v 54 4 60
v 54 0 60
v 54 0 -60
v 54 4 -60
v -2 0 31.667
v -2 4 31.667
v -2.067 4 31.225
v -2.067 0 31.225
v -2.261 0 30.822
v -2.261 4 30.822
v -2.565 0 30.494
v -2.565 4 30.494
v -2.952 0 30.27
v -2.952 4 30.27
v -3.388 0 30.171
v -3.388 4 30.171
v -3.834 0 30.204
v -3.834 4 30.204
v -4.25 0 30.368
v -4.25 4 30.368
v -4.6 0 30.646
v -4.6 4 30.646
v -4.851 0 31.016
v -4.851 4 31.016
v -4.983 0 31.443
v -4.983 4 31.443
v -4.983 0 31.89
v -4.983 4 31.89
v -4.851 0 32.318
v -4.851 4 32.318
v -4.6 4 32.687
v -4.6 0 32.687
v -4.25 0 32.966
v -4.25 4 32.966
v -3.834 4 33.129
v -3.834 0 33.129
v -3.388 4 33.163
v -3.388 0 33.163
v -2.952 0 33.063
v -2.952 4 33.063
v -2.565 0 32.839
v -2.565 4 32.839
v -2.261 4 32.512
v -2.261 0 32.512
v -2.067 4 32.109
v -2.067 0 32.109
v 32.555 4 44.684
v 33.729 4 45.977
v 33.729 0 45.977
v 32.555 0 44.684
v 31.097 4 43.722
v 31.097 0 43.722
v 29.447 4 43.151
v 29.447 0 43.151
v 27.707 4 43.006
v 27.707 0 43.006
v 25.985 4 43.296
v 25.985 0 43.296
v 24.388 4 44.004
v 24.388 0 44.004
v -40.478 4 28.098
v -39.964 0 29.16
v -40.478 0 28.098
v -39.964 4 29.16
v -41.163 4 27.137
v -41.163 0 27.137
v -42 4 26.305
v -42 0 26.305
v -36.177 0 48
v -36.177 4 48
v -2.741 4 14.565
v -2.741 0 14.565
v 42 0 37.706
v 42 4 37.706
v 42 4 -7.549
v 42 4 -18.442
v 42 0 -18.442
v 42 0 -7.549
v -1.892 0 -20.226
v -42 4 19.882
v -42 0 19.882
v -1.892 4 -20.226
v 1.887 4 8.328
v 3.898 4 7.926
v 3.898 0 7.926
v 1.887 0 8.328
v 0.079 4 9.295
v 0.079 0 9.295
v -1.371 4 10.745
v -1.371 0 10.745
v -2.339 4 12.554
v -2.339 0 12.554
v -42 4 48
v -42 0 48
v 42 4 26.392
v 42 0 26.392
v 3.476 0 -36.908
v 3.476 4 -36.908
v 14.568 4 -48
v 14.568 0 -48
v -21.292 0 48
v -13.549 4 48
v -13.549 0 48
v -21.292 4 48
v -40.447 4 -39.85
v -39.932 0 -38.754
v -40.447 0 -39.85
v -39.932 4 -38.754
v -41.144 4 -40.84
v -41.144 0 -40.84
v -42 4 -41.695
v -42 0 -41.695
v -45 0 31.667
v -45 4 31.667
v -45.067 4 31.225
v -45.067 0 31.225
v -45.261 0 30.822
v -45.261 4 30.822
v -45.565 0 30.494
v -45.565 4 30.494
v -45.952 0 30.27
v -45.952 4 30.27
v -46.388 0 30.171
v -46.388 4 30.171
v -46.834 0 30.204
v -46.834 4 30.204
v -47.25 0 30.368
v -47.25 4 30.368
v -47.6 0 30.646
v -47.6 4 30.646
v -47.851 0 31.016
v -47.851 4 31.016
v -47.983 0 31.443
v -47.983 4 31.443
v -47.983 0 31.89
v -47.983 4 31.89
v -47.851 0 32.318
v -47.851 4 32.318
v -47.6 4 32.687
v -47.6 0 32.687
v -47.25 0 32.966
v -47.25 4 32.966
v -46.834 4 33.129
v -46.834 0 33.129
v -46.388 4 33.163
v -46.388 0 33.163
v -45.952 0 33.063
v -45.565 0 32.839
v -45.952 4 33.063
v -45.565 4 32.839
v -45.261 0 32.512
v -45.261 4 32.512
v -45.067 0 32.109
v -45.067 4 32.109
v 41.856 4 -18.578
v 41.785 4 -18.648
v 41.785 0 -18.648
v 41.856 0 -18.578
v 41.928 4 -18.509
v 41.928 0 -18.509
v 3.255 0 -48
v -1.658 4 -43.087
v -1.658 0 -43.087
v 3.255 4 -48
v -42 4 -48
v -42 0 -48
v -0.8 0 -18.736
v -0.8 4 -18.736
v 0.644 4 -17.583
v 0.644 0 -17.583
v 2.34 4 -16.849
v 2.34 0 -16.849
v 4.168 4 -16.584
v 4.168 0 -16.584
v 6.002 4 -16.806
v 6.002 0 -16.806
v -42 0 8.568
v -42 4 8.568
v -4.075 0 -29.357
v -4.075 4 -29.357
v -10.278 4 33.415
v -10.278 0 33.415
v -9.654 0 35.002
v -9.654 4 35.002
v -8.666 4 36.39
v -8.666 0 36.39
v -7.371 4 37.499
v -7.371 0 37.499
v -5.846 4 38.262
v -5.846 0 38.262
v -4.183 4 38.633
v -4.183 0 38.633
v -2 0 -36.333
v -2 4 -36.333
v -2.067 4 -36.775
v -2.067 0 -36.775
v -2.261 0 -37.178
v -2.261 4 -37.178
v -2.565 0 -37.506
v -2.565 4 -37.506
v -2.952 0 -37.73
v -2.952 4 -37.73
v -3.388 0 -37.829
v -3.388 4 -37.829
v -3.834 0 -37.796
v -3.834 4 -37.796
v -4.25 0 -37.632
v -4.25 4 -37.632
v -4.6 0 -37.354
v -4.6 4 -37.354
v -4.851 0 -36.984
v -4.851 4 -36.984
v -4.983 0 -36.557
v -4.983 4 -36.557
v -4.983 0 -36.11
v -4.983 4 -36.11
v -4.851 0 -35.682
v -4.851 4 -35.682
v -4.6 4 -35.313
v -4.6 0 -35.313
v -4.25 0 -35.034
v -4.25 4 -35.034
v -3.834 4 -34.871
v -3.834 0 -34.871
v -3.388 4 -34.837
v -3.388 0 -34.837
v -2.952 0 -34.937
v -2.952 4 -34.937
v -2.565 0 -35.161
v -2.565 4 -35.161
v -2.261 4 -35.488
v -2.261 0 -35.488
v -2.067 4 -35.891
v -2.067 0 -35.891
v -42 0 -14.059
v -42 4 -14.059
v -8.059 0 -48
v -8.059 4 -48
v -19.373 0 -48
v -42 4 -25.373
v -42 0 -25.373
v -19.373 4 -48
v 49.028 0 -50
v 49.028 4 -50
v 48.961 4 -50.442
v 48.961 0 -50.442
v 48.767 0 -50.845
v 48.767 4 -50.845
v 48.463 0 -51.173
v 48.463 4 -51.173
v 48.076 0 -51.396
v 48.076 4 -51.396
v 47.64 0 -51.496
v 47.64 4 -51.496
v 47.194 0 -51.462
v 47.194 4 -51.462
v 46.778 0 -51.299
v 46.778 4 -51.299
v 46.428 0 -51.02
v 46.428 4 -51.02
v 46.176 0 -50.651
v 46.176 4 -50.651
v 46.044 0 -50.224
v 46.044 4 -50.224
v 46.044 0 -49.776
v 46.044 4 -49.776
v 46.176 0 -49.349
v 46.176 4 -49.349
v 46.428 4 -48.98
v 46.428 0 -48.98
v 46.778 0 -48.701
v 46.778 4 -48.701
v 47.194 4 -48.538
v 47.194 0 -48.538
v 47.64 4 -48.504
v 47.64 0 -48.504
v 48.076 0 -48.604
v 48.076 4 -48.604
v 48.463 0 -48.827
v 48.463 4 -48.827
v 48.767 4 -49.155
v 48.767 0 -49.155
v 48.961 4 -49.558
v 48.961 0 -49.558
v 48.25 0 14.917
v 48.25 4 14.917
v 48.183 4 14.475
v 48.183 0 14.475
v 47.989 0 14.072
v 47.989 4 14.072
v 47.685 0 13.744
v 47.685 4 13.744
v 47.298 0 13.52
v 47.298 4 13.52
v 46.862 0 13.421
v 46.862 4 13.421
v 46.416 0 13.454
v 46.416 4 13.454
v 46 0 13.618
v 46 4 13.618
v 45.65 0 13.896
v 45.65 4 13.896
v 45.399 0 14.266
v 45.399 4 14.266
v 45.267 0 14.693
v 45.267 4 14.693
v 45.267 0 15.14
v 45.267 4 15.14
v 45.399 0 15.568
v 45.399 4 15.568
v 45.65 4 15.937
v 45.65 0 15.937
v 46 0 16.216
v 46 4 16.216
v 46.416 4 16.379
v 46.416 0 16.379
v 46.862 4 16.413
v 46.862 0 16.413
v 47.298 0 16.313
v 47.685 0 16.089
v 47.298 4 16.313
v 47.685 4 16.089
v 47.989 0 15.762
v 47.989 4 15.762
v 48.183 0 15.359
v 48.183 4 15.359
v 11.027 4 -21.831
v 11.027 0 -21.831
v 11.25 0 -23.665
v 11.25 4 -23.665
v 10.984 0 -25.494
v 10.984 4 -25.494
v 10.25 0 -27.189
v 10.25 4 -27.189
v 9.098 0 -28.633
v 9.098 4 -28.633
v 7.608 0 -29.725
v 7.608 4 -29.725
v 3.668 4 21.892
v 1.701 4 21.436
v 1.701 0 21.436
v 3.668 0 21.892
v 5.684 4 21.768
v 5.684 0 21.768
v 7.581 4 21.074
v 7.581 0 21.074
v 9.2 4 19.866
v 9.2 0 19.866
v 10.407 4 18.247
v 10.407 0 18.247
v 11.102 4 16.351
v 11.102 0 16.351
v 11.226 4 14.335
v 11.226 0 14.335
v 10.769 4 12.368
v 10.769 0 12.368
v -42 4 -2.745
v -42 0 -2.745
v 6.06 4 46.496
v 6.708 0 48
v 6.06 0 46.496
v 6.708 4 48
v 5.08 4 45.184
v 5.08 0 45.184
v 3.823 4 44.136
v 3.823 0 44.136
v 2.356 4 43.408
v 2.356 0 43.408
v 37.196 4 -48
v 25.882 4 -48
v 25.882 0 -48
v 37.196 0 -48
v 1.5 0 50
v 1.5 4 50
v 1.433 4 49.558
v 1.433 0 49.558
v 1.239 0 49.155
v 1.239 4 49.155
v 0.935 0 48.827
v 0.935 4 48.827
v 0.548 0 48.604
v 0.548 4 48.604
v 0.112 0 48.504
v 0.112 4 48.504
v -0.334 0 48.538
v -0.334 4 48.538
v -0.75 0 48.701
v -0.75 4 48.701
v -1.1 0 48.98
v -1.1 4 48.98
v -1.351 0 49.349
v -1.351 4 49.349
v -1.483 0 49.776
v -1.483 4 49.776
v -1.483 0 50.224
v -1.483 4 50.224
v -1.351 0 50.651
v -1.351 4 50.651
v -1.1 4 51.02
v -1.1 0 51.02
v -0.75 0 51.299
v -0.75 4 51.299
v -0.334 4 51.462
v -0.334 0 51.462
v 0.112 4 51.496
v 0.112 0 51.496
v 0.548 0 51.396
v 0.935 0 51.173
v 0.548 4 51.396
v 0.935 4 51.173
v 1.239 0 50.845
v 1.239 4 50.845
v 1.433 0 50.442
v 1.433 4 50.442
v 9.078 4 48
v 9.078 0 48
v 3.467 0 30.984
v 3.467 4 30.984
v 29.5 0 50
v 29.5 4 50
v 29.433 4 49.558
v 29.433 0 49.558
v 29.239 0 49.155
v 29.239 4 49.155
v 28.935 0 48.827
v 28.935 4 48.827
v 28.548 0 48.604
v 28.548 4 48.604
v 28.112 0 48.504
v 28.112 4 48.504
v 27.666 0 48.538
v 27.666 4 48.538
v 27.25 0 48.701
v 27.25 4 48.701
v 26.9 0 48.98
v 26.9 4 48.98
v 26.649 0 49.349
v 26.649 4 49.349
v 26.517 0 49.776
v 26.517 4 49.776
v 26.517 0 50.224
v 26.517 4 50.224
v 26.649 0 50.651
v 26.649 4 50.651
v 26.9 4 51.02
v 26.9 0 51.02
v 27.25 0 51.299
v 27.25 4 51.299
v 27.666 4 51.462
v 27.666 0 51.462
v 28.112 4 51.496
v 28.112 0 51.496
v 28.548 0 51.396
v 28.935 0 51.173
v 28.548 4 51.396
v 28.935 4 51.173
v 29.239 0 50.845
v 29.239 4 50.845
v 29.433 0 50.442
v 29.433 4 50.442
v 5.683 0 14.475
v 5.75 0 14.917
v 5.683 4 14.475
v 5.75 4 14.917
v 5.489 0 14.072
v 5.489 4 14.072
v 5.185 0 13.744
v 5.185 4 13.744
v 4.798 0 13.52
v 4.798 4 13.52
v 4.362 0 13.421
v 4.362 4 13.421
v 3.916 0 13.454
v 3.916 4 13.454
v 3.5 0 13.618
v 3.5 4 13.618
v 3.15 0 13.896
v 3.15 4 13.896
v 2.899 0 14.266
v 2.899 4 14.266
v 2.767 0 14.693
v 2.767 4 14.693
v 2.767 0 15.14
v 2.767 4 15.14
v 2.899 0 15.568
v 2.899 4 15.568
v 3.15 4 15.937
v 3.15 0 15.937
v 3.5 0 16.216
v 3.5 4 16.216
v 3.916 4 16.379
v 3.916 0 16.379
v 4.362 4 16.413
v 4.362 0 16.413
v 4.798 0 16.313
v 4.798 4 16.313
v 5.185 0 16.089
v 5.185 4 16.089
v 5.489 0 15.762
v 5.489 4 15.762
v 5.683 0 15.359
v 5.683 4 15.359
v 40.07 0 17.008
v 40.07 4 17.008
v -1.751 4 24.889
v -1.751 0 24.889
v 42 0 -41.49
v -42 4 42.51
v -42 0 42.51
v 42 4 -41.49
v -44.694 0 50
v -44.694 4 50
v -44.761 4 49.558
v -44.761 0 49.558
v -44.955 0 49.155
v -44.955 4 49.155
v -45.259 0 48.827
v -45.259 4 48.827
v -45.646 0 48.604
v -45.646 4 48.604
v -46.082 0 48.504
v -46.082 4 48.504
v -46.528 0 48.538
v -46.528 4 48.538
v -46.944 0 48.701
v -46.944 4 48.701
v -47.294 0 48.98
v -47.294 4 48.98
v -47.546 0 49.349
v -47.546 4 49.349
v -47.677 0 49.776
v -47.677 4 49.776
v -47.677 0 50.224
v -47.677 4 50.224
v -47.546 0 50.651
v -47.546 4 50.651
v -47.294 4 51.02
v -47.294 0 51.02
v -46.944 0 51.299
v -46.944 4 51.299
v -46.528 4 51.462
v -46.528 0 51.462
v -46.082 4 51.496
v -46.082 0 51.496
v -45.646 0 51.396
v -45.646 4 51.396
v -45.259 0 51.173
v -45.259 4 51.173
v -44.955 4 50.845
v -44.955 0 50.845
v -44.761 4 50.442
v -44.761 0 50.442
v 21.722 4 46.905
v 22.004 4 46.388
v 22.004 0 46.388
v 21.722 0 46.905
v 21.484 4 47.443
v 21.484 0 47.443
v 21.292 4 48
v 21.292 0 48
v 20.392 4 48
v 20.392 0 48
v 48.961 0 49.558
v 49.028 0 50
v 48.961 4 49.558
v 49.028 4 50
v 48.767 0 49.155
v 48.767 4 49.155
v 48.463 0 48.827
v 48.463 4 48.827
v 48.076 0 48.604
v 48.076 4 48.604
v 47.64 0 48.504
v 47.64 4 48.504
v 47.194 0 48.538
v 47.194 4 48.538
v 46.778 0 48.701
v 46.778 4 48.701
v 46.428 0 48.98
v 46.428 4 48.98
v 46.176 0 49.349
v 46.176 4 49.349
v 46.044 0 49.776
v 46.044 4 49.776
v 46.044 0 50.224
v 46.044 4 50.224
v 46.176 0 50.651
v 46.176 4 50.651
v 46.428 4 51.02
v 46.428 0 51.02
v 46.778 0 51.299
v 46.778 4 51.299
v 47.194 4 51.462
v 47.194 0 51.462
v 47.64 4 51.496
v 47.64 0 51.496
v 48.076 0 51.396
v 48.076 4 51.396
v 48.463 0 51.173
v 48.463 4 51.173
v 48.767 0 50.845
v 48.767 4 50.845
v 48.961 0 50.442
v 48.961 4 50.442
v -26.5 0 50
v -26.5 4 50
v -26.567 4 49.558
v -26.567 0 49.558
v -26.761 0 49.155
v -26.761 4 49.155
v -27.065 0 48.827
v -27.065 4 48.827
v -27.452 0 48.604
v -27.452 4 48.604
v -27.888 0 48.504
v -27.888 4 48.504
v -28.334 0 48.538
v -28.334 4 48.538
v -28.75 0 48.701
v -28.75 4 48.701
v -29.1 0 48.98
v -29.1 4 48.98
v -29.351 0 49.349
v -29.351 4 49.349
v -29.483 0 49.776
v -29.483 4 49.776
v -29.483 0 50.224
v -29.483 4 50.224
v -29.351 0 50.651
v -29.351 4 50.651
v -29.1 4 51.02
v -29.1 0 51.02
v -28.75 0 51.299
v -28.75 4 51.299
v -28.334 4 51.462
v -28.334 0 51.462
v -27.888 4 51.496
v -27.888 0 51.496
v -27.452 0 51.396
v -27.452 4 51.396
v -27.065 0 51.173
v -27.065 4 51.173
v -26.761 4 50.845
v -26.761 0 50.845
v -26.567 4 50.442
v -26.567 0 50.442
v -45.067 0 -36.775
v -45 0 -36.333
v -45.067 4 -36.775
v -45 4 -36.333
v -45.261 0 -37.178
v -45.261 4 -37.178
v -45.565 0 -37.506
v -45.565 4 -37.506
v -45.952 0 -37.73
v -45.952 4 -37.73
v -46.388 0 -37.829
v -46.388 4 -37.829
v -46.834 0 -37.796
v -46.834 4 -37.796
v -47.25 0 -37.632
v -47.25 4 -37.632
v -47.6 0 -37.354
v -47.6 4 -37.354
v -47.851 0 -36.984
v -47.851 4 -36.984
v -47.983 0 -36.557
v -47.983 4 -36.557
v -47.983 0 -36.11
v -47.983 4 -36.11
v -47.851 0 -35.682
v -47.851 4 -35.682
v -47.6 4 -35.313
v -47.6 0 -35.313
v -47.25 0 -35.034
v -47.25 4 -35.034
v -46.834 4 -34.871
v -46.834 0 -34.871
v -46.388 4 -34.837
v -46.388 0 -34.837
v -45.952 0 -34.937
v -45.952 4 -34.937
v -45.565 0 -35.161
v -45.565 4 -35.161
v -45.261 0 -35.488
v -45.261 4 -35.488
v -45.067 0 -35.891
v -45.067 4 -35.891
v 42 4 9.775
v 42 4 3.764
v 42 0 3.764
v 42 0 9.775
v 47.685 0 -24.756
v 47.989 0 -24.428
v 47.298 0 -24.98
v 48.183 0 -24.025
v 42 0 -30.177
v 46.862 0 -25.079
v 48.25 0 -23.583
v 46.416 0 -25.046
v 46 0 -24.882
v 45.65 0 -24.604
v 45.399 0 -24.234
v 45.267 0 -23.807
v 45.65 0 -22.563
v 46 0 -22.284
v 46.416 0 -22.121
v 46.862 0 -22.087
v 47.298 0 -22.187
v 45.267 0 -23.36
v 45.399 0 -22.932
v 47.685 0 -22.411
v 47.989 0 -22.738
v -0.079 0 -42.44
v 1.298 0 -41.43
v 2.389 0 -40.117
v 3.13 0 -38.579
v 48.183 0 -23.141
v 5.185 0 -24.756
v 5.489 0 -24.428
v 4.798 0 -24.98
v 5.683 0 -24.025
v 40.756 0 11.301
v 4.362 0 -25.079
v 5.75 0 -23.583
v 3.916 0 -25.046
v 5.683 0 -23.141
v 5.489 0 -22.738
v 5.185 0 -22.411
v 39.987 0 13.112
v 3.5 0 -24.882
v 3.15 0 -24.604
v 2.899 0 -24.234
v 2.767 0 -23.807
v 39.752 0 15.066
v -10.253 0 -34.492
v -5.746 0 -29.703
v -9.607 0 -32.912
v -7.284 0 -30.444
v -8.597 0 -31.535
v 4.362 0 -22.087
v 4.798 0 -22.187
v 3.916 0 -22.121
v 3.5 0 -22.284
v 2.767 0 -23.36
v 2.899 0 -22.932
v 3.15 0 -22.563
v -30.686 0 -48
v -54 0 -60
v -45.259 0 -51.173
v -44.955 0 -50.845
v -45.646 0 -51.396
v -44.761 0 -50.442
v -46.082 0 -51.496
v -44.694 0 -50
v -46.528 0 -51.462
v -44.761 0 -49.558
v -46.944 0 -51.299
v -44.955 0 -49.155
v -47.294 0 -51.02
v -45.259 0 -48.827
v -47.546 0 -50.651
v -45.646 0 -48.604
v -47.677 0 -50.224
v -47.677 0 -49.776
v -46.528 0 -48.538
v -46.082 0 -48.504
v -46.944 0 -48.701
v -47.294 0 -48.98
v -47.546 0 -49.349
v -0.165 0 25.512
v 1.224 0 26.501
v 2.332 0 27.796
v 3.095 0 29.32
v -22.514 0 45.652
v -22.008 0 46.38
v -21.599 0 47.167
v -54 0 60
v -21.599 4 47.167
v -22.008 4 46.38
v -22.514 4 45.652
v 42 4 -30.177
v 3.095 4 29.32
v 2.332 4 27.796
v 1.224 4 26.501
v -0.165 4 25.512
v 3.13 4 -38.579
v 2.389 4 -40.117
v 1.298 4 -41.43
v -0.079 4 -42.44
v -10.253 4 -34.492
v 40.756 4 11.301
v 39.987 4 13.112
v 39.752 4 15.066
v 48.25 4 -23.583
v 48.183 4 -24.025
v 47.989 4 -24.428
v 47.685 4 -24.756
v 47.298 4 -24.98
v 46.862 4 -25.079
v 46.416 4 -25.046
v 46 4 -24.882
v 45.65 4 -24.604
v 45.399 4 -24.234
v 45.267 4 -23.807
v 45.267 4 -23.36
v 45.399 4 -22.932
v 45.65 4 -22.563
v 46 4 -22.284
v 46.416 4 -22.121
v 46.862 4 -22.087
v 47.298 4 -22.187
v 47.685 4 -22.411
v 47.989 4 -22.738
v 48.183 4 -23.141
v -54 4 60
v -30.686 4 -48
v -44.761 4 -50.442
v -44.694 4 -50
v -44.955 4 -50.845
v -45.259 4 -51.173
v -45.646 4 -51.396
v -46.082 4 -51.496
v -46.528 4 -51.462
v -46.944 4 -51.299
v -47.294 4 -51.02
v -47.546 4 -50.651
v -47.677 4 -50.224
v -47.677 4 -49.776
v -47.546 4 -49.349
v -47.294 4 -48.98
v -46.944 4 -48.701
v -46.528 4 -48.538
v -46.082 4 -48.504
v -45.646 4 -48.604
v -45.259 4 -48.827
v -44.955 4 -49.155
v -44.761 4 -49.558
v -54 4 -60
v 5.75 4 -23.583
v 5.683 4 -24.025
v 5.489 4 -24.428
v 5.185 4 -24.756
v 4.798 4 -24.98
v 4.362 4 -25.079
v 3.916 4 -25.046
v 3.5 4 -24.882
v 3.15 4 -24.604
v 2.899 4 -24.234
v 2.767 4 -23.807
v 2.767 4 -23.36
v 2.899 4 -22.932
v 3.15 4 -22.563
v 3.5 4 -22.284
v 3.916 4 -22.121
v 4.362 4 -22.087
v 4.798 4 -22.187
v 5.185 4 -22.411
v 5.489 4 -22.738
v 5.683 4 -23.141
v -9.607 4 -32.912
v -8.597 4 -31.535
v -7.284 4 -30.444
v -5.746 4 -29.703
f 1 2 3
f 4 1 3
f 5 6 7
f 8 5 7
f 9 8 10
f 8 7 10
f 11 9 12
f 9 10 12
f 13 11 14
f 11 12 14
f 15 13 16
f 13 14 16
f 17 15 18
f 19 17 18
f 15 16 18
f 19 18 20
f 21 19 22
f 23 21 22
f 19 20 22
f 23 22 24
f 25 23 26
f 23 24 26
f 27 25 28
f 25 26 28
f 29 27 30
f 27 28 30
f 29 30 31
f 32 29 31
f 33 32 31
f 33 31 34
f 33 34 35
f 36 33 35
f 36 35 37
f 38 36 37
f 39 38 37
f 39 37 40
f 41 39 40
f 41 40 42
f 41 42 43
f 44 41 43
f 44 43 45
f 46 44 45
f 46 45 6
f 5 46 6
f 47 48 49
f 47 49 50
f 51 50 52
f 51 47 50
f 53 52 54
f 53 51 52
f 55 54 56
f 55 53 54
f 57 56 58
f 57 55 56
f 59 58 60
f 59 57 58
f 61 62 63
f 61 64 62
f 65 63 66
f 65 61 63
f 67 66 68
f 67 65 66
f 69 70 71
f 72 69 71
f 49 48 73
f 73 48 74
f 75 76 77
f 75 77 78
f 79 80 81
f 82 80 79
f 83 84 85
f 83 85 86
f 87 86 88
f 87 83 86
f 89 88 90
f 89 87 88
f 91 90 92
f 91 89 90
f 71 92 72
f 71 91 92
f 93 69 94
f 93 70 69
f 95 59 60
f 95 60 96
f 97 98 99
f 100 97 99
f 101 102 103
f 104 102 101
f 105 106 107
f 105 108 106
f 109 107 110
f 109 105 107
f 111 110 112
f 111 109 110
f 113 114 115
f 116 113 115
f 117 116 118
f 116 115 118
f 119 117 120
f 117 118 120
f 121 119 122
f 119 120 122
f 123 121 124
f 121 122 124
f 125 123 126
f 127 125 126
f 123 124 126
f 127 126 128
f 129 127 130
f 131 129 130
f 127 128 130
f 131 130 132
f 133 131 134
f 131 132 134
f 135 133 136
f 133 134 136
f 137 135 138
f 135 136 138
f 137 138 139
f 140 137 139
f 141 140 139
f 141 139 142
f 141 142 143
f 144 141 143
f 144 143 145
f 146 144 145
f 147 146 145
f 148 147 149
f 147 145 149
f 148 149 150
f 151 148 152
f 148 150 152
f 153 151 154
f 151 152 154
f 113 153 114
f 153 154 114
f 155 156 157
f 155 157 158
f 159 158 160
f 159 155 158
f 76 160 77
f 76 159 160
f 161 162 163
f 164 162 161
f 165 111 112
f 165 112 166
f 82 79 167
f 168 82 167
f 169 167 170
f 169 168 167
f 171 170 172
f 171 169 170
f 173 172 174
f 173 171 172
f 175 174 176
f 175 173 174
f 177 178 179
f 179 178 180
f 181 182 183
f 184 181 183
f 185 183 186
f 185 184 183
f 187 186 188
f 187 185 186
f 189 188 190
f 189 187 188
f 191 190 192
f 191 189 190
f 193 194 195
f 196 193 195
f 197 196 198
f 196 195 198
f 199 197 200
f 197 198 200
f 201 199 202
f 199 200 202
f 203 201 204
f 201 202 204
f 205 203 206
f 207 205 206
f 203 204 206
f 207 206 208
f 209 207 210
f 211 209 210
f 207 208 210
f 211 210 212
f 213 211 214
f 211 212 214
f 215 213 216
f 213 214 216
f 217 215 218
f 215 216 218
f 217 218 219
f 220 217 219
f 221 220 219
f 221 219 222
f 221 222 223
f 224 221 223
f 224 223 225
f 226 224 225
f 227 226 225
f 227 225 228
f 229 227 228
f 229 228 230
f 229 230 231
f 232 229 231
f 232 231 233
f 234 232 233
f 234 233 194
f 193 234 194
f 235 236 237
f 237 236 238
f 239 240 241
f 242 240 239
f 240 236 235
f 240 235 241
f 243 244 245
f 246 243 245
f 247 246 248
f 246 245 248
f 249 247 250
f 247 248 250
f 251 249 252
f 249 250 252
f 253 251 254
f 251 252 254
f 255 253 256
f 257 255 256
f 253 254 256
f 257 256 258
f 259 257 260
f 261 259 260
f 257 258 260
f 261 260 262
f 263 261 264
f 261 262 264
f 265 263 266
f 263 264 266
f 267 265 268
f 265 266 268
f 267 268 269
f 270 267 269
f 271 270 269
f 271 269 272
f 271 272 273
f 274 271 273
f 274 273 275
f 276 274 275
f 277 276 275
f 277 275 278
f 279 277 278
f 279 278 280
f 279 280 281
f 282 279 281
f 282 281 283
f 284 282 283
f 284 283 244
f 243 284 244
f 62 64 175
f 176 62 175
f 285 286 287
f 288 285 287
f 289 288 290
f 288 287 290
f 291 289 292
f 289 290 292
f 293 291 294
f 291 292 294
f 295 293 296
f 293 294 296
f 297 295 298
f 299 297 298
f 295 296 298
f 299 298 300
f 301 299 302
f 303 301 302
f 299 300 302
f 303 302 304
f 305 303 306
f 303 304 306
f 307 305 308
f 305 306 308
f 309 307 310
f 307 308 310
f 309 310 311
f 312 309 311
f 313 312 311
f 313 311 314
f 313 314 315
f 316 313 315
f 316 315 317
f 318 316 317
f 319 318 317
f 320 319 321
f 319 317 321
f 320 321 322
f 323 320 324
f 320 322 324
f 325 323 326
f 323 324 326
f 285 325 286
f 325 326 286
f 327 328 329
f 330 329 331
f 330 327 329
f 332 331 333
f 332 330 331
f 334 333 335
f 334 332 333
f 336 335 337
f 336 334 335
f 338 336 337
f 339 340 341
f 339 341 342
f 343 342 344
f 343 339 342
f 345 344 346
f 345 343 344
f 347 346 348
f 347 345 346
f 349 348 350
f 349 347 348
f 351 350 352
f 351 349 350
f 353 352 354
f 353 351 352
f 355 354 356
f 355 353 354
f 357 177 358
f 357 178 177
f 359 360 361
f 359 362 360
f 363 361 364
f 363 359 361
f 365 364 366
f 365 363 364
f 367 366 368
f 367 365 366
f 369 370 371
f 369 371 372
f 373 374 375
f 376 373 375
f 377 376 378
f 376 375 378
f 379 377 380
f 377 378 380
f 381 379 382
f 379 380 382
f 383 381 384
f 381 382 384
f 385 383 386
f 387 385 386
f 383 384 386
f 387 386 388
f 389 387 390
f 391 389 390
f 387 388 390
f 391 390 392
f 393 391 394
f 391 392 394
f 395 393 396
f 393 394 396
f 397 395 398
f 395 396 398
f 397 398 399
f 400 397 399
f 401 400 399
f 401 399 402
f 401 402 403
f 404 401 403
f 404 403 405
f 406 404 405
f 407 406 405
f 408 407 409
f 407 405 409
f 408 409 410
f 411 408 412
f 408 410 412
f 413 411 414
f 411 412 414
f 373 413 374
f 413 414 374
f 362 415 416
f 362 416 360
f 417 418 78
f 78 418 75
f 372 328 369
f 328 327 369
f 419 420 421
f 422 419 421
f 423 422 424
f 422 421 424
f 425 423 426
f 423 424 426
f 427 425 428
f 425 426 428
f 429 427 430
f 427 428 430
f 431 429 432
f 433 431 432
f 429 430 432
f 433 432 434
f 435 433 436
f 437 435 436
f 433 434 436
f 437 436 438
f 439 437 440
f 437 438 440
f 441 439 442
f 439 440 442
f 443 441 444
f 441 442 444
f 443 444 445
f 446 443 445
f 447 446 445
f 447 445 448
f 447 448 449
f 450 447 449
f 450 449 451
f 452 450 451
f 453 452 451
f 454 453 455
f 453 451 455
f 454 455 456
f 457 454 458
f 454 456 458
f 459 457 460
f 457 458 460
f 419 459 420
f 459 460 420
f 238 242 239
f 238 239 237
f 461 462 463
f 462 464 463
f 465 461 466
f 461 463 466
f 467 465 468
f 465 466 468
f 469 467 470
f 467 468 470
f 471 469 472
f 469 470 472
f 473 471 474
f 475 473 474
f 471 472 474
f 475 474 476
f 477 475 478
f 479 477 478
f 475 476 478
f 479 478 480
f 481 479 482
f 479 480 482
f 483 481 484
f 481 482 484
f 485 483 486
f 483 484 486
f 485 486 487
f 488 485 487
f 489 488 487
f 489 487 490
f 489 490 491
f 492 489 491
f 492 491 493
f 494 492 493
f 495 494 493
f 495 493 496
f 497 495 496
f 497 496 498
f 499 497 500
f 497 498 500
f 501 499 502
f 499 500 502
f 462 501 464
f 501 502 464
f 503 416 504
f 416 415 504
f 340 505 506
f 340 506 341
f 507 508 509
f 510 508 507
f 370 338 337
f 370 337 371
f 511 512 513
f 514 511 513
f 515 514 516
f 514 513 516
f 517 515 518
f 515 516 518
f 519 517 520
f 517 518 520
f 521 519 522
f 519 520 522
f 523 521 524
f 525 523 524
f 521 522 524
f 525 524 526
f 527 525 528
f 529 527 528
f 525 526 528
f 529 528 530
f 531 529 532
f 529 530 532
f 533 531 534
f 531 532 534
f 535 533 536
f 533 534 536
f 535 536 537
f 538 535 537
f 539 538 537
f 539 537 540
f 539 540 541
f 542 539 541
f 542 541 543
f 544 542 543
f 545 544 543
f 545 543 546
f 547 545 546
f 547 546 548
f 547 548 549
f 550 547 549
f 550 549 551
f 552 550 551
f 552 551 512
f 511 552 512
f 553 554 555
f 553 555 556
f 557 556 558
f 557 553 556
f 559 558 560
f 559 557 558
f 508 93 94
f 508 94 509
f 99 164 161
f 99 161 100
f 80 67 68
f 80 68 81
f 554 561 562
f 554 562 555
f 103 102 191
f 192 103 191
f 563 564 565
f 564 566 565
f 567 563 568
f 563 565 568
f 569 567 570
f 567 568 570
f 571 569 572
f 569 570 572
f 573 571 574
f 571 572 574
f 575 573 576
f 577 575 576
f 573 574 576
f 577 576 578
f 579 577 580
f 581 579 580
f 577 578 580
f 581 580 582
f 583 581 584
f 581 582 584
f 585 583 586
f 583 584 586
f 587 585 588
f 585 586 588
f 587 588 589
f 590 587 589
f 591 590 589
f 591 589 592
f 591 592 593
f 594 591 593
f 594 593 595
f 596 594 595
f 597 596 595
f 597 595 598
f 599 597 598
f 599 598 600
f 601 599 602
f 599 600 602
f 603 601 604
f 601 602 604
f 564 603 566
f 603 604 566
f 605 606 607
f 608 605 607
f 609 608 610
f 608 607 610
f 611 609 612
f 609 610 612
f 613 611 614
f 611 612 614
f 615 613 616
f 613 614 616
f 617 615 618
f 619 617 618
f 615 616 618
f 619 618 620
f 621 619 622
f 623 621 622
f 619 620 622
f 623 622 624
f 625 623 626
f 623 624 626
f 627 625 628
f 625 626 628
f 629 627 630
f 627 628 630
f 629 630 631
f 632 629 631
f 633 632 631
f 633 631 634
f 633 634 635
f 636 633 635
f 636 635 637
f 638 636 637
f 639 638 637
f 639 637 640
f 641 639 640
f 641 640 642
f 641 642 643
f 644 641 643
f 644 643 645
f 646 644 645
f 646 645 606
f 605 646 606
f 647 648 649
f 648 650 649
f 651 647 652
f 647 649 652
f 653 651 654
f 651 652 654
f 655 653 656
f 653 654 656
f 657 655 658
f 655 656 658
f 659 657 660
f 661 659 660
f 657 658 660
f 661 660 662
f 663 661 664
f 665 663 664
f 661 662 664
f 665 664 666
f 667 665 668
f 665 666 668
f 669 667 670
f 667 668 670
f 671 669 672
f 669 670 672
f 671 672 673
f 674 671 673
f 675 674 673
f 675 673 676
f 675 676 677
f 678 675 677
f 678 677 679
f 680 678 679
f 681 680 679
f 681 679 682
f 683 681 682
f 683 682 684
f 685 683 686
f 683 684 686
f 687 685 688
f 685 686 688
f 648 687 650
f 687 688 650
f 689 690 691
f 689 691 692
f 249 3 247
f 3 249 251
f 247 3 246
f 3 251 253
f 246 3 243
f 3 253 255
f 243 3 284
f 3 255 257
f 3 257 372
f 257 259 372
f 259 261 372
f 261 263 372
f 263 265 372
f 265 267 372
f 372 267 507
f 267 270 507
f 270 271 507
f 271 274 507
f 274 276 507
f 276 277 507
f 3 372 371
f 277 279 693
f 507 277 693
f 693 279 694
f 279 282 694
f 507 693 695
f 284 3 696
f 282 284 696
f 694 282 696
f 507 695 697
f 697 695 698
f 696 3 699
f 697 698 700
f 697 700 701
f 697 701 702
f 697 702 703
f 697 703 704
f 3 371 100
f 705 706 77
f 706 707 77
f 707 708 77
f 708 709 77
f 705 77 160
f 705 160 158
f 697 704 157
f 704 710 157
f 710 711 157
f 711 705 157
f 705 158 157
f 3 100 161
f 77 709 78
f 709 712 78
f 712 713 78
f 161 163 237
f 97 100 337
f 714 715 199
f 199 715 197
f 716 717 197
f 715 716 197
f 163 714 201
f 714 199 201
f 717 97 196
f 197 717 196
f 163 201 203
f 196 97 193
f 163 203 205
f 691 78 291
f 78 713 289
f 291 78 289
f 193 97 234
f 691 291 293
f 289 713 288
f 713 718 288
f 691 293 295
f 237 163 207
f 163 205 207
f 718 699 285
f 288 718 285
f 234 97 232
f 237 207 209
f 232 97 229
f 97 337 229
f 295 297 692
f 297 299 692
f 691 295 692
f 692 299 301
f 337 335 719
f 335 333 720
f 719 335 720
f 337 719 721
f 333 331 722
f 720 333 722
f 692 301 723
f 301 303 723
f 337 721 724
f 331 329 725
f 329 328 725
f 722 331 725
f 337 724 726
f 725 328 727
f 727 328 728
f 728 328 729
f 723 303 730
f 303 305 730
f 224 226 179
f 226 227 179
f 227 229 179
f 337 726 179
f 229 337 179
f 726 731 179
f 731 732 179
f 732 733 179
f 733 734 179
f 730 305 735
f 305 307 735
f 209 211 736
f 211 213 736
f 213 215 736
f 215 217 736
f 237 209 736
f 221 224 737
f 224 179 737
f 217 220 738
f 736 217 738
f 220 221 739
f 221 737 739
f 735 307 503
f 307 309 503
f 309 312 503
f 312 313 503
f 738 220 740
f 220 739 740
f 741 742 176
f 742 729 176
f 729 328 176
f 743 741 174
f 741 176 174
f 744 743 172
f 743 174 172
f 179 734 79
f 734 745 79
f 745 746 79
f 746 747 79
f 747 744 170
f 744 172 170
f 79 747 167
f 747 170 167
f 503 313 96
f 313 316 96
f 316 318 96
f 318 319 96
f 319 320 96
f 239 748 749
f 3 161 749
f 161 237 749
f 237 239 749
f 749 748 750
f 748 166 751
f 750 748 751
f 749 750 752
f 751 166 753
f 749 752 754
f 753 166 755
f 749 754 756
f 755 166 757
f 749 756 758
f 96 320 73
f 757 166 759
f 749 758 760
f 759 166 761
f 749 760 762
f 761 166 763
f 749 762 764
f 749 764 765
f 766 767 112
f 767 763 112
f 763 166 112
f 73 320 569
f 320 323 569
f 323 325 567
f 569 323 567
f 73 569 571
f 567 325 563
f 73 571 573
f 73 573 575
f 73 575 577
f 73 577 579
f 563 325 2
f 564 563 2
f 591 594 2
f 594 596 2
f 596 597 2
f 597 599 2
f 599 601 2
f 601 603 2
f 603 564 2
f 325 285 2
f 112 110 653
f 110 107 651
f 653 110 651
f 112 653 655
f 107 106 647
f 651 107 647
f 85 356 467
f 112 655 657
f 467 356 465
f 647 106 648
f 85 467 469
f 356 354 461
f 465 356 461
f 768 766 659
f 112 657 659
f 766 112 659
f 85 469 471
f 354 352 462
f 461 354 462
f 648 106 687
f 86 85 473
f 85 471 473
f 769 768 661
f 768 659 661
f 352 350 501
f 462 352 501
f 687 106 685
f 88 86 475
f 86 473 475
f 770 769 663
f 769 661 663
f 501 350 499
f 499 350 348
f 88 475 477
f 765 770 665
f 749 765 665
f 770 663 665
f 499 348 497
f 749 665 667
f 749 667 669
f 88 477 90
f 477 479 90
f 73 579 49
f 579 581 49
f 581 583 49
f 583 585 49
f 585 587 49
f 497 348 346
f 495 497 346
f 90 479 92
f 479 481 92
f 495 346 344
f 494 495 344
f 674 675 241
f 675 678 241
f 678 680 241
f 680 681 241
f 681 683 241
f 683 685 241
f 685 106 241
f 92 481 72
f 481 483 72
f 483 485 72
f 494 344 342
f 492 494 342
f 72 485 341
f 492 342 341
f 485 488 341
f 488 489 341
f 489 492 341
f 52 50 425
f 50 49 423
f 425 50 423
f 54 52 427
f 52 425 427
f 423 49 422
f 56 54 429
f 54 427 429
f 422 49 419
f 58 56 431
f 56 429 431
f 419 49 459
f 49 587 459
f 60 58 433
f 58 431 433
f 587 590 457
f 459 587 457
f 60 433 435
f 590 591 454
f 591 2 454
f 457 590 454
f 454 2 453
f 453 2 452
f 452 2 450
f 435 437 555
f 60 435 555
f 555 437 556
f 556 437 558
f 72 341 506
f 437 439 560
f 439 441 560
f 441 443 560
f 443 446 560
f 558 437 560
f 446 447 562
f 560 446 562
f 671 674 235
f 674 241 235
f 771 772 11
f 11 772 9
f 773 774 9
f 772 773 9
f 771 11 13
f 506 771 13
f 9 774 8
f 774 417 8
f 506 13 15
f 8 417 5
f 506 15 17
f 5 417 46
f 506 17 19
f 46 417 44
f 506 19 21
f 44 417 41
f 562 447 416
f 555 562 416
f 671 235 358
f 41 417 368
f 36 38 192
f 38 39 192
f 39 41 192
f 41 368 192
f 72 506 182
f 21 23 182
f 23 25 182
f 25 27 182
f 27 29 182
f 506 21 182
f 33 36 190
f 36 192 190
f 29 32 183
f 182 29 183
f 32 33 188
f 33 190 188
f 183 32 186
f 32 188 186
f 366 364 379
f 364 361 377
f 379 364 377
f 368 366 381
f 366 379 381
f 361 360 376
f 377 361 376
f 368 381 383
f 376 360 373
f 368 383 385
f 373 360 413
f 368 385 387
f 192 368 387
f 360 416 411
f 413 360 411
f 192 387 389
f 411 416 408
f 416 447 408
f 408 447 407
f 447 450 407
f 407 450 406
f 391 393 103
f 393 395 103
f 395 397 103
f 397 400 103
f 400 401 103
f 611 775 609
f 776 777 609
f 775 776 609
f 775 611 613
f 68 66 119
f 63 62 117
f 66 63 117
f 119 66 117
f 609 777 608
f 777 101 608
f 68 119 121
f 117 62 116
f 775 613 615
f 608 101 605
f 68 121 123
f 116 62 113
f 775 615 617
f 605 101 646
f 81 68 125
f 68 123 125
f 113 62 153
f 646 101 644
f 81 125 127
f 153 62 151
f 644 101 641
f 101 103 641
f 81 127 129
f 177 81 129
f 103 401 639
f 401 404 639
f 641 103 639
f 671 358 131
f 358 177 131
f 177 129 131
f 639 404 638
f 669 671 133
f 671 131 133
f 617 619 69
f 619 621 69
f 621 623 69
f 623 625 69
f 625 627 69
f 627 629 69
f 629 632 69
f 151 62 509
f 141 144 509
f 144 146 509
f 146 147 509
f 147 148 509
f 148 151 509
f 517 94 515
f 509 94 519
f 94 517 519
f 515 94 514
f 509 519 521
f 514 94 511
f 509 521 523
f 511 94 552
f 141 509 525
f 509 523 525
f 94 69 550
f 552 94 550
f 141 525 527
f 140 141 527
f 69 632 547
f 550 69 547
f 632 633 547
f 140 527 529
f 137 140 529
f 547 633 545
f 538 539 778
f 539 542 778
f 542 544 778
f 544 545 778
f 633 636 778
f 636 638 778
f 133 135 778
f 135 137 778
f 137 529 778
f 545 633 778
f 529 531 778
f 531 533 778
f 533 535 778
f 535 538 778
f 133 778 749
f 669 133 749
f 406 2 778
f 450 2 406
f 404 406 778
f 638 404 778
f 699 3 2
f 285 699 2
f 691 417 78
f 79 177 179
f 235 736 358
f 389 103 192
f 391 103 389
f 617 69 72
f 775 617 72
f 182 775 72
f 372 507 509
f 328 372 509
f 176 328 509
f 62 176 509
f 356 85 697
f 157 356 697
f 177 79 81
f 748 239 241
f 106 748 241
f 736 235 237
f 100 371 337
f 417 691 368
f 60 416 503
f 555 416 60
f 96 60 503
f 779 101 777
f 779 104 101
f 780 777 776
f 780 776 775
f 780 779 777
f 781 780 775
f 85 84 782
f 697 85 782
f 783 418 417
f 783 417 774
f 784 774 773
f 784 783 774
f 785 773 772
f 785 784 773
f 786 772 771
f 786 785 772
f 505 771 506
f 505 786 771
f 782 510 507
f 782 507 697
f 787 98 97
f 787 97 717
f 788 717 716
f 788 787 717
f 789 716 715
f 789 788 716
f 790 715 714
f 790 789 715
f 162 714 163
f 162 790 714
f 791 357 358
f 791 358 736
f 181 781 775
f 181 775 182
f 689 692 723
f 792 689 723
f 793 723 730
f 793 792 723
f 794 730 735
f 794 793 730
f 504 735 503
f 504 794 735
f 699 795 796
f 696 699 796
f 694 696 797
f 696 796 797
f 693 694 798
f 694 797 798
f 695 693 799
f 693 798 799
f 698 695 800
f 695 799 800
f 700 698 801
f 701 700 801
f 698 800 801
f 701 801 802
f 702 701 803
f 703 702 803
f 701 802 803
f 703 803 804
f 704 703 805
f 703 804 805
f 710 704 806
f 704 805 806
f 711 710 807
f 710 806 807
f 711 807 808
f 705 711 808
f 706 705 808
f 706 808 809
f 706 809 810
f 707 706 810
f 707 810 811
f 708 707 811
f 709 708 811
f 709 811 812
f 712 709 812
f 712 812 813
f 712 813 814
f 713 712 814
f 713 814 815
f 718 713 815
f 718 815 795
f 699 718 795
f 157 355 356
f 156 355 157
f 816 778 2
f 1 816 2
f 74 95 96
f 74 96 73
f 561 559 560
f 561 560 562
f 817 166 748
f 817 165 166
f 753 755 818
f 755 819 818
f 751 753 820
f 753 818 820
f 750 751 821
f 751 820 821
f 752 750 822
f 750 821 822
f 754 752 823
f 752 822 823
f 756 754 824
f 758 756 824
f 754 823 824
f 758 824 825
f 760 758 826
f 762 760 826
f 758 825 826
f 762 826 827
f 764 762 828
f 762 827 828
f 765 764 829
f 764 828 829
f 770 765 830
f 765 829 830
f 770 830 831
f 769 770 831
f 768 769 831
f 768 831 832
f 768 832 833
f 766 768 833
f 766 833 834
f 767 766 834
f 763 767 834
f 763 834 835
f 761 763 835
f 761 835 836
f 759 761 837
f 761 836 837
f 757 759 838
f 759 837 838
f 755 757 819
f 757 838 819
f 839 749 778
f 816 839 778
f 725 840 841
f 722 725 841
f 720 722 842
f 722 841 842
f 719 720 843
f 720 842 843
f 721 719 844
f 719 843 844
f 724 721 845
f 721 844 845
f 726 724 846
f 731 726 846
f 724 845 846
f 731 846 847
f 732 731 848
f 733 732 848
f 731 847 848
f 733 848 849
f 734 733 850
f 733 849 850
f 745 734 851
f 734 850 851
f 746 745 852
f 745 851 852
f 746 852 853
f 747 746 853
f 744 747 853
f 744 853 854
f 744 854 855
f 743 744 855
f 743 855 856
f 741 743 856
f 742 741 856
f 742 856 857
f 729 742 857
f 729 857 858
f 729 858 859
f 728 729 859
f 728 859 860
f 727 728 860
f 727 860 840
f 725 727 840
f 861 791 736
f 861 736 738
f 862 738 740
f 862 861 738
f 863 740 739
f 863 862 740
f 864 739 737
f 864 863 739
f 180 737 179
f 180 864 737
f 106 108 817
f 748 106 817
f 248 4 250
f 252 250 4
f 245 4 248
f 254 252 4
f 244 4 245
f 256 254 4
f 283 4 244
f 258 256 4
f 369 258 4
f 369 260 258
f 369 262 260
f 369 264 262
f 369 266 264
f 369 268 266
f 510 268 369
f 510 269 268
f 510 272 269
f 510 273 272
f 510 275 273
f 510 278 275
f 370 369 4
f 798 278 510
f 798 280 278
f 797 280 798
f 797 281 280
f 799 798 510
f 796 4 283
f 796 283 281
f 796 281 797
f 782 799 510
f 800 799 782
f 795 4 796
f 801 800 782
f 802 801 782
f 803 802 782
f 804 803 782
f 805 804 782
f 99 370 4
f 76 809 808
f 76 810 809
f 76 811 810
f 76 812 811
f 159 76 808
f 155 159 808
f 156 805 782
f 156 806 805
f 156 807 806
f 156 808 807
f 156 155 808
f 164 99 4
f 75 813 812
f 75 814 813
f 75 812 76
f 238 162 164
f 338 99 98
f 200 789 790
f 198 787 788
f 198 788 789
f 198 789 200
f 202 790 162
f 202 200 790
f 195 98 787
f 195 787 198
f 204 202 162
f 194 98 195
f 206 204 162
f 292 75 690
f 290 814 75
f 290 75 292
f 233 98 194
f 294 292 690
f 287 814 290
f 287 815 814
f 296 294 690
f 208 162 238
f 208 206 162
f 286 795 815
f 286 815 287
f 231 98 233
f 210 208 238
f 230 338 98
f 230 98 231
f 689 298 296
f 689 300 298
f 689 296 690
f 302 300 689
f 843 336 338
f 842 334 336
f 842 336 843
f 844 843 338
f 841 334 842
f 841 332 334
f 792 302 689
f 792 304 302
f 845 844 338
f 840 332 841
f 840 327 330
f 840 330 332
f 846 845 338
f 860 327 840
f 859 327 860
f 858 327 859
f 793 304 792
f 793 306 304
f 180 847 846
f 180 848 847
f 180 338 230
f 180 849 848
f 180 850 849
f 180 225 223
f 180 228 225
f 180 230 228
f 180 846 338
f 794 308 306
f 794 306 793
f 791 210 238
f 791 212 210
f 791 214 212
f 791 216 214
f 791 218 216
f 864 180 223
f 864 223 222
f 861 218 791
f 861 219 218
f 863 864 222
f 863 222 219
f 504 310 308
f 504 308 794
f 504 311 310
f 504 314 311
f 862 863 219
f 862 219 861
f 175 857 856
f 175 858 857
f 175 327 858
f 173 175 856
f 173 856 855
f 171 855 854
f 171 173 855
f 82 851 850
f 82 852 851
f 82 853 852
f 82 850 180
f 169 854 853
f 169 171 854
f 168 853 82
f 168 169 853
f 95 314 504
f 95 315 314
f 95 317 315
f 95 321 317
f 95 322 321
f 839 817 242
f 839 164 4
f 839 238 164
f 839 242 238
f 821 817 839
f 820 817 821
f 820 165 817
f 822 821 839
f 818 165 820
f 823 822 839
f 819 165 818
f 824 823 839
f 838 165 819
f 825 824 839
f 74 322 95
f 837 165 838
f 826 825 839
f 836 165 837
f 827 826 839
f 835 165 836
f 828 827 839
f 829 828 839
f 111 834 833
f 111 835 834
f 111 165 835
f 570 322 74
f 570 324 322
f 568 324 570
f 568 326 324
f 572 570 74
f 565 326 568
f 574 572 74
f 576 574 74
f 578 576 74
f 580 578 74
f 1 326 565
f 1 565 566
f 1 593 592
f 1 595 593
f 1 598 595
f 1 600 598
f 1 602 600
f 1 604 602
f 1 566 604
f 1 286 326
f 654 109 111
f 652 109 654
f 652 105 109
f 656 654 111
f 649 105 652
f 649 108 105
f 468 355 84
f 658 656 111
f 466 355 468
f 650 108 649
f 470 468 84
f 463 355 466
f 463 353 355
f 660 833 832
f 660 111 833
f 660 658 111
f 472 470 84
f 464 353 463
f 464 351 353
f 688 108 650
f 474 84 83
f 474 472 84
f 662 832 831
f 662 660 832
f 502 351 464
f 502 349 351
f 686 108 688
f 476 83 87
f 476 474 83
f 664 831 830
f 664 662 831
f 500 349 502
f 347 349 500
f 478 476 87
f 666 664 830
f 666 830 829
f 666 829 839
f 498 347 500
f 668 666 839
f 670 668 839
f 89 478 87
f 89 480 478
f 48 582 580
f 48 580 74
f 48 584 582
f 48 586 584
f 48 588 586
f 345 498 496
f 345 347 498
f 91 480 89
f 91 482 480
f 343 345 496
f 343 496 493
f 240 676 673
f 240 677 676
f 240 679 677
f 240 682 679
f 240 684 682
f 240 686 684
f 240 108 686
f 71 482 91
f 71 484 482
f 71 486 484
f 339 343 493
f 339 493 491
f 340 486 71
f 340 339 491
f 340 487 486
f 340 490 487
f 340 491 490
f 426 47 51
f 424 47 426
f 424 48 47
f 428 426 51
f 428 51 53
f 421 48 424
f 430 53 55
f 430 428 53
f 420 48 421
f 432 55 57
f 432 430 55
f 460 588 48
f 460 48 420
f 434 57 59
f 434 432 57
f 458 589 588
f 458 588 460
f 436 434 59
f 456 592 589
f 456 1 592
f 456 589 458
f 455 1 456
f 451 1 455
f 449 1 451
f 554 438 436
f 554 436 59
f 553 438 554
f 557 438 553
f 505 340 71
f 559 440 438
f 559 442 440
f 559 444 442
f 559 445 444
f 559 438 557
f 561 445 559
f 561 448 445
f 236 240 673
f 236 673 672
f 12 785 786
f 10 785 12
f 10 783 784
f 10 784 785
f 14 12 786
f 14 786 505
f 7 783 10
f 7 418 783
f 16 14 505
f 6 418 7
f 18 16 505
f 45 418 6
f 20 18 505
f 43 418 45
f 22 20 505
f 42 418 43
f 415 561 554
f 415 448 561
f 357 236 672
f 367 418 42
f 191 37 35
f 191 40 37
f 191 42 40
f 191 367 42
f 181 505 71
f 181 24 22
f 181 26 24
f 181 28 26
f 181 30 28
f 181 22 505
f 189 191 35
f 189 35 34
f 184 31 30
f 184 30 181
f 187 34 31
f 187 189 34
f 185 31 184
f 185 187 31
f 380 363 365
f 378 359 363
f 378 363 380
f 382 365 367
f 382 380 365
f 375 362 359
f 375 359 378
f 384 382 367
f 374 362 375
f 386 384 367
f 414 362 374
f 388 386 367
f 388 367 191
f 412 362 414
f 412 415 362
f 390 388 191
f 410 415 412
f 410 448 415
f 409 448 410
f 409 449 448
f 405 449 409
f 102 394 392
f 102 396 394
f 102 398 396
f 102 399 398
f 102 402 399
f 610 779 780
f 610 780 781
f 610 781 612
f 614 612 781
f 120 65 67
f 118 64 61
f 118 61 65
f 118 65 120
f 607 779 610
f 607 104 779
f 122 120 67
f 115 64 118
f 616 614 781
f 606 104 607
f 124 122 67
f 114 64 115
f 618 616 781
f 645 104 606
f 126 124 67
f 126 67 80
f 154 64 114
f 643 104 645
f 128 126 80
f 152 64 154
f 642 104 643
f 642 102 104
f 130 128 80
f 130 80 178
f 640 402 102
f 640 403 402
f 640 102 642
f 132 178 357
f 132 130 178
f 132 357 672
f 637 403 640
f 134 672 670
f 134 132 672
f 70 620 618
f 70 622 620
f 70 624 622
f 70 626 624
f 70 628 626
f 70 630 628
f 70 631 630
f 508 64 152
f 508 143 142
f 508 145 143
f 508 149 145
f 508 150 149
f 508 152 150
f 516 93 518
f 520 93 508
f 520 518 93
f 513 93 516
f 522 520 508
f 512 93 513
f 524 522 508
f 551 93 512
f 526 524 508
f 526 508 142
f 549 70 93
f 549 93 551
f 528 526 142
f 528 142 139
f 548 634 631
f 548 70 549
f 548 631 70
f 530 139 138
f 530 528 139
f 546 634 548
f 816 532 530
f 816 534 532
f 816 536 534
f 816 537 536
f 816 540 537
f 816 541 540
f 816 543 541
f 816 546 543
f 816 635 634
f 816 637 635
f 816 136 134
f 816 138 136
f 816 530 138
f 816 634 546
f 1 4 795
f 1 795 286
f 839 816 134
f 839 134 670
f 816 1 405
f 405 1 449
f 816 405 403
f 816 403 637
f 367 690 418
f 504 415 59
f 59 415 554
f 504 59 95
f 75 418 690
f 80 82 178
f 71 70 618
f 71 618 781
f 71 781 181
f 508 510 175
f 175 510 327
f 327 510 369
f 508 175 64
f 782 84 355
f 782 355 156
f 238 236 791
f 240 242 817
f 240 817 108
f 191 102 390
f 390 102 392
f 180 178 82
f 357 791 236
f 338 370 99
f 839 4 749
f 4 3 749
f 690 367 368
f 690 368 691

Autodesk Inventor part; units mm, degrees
ref_plane "YZ Plane" through (0, 0, 0) normal (1, 0, 0) x (0, 1, 0)
ref_plane "XZ Plane" through (0, 0, 0) normal (0, 1, 0) x (-1, 0, 0)
ref_plane "XY Plane" through (0, 0, 0) normal (0, 0, 1) x (1, 0, 0)
sketch "Boceto1" plane through (0, 0, 0) normal (0, 1, 0) x (-1, 0, 0)
  line L0 (54, 60) -> (-54, 60)
  line L1 (-54, 60) -> (-54, -60)
  line L2 (-54, -60) -> (54, -60)
  line L3 (54, -60) -> (54, 60)
  line L4 (141.1986, 0) -> (-141.1986, 0) construction
  line L5 (0, -44.0939) -> (0, 44.0939) construction
  point P0 (0, 0)
  point P1 (54, 0)
  point P2 (0, -60)
  point P3 (0, 0)
  dimension "d0" = 108
  dimension "d1" = 120
extrude "Extrusión1" add sketch "Boceto1" along normal blind 4
sketch "Boceto2" plane through (0, 4, 0) normal (0, 1, 0) x (1, 0, 0)
  circle A0 centre (-46.5, 36.3333) radius 1.5 projected
  circle A1 centre (-3.5, 36.3333) radius 1.5 projected
  circle A2 centre (-46.5, -31.6667) radius 1.5 projected
  circle A3 centre (-3.5, -31.6667) radius 1.5 projected
  circle A4 centre (4.25, -14.9167) radius 1.5 projected
  circle A5 centre (46.75, -14.9167) radius 1.5 projected
  circle A6 centre (46.75, 23.5833) radius 1.5 projected
  circle A7 centre (4.25, 23.5833) radius 1.5 projected
  circle A8 centre (0, -50) radius 1.5
  circle A9 centre (28, -50) radius 1.5
  circle A10 centre (-28, -50) radius 1.5
  line L0 (-28, -50) -> (28, -50) construction
  line L1 (-54, -60) -> (54, -60) construction
  circle A11 centre (-46.5, 36.3333) radius 7
  circle A12 centre (-3.5, 36.3333) radius 7
  circle A13 centre (4.25, 23.5833) radius 7
  circle A14 centre (46.75, 23.5833) radius 7
  circle A15 centre (46.75, -14.9167) radius 7
  circle A16 centre (4.25, -14.9167) radius 7
  circle A17 centre (-3.5, -31.6667) radius 7
  circle A18 centre (-46.5, -31.6667) radius 7
  circle A19 centre (-28, -50) radius 7
  circle A20 centre (0, -50) radius 7
  circle A21 centre (28, -50) radius 7
  point P0 (0, 0)
  dimension "d9" = 28
  dimension "d10" = 3
  dimension "d11" = 10
  dimension "d33" = 14
sketch "Boceto3" plane through (0, 4, 0) normal (0, 1, 0) x (1, 0, 0)
  line L0 (-54, -60) -> (54, -60) projected
  line L1 (54, -60) -> (54, 60) projected
  line L2 (54, 60) -> (-54, 60) projected
  line L3 (-54, 60) -> (-54, -60) projected
  line L4 (-42, 48) -> (42, 48)
  line L5 (42, 48) -> (42, -48)
  line L6 (42, -48) -> (-42, -48)
  line L7 (-42, -48) -> (-42, 48)
  line L8 (-42, 36.6863) -> (-30.6863, 48)
  line L9 (-42, 25.3726) -> (-19.3726, 48)
  line L10 (-42, 14.0589) -> (-8.0589, 48)
  line L11 (-42, 2.7452) -> (3.2548, 48)
  line L12 (-42, -8.5685) -> (14.5685, 48)
  line L13 (-42, -19.8823) -> (25.8823, 48)
  line L14 (-42, -31.196) -> (37.196, 48)
  line L15 (-42, -42.5097) -> (42, 41.4903)
  line L16 (-36.1766, -48) -> (42, 30.1766)
  line L17 (-24.8629, -48) -> (42, 18.8629)
  line L18 (-13.5492, -48) -> (42, 7.5492)
  line L19 (-2.2355, -48) -> (42, -3.7645)
  line L20 (9.0782, -48) -> (42, -15.0782)
  line L21 (20.3919, -48) -> (42, -26.3919)
  line L22 (31.7056, -48) -> (42, -37.7056)
  point P0 (0, 0)
  point P1 (0, 48)
  point P2 (0, 60)
  dimension "d12" = 12
  dimension "d13" = 12
  dimension "d14" = 12
  dimension "d15" = 45
  dimension "d16" = 8
  dimension "d17" = 8
  dimension "d18" = 8
  dimension "d19" = 8
  dimension "d20" = 8
  dimension "d21" = 8
  dimension "d22" = 8
  dimension "d23" = 8
  dimension "d24" = 8
  dimension "d25" = 8
  dimension "d26" = 8
  dimension "d27" = 8
  dimension "d28" = 8
  dimension "d29" = 8
  dimension "d30" = 8
extrude "Extrusión2" cut sketch "Boceto3" against normal blind 10 contours L4 L8 L7 | L4 L10 L7 L9 | L4 L12 L7 L11 | L4 L14 L7 L13 | L15 L5 L16 L6 L7 | L5 L18 L6 L17 | L5 L20 L6 L19 | L5 L22 L6 L21
extrude "Extrusión3" add sketch "Boceto2" against normal blind 4
sketch "Boceto4" plane through (0, 4, 0) normal (0, 1, 0) x (1, 0, 0)
  circle A0 centre (-46.5, 36.3333) radius 1.5 projected
  circle A1 centre (46.75, 23.5833) radius 1.5 projected
  circle A2 centre (46.75, -14.9167) radius 1.5 projected
  circle A3 centre (28, -50) radius 1.5 projected
  circle A4 centre (0, -50) radius 1.5 projected
  circle A5 centre (-28, -50) radius 1.5 projected
  circle A6 centre (-46.5, -31.6667) radius 1.5 projected
  circle A7 centre (4.25, -14.9167) radius 1.5 projected
  point P0 (0, 0)
extrude "Extrusión4" cut sketch "Boceto4" against normal through all
sketch "Boceto5" plane through (0, 4, 0) normal (0, 1, 0) x (1, 0, 0)
  circle A0 centre (-46.1942, 50) radius 1.5 projected
  circle A1 centre (47.5275, 50) radius 1.5 projected
  circle A2 centre (-46.1942, -50) radius 1.5 projected
  circle A3 centre (47.5275, -50) radius 1.5 projected
  point P0 (0, 0)
extrude "Extrusión5" cut sketch "Boceto5" against normal through all
equation "\"d13\" = d12"
equation "\"d17\" = d16"
equation "\"d18\" = d16"
equation "\"d19\" = d18"
equation "\"d20\" = d19"
equation "\"d21\" = d20"
equation "\"d22\" = d21"
equation "\"d23\" = d22"
equation "\"d24\" = d23"
equation "\"d25\" = d24"
equation "\"d26\" = d25"
equation "\"d27\" = d26"
equation "\"d28\" = d27"
equation "\"d29\" = d28"
equation "\"d30\" = d29"
properties part number "bandeja componentes"
